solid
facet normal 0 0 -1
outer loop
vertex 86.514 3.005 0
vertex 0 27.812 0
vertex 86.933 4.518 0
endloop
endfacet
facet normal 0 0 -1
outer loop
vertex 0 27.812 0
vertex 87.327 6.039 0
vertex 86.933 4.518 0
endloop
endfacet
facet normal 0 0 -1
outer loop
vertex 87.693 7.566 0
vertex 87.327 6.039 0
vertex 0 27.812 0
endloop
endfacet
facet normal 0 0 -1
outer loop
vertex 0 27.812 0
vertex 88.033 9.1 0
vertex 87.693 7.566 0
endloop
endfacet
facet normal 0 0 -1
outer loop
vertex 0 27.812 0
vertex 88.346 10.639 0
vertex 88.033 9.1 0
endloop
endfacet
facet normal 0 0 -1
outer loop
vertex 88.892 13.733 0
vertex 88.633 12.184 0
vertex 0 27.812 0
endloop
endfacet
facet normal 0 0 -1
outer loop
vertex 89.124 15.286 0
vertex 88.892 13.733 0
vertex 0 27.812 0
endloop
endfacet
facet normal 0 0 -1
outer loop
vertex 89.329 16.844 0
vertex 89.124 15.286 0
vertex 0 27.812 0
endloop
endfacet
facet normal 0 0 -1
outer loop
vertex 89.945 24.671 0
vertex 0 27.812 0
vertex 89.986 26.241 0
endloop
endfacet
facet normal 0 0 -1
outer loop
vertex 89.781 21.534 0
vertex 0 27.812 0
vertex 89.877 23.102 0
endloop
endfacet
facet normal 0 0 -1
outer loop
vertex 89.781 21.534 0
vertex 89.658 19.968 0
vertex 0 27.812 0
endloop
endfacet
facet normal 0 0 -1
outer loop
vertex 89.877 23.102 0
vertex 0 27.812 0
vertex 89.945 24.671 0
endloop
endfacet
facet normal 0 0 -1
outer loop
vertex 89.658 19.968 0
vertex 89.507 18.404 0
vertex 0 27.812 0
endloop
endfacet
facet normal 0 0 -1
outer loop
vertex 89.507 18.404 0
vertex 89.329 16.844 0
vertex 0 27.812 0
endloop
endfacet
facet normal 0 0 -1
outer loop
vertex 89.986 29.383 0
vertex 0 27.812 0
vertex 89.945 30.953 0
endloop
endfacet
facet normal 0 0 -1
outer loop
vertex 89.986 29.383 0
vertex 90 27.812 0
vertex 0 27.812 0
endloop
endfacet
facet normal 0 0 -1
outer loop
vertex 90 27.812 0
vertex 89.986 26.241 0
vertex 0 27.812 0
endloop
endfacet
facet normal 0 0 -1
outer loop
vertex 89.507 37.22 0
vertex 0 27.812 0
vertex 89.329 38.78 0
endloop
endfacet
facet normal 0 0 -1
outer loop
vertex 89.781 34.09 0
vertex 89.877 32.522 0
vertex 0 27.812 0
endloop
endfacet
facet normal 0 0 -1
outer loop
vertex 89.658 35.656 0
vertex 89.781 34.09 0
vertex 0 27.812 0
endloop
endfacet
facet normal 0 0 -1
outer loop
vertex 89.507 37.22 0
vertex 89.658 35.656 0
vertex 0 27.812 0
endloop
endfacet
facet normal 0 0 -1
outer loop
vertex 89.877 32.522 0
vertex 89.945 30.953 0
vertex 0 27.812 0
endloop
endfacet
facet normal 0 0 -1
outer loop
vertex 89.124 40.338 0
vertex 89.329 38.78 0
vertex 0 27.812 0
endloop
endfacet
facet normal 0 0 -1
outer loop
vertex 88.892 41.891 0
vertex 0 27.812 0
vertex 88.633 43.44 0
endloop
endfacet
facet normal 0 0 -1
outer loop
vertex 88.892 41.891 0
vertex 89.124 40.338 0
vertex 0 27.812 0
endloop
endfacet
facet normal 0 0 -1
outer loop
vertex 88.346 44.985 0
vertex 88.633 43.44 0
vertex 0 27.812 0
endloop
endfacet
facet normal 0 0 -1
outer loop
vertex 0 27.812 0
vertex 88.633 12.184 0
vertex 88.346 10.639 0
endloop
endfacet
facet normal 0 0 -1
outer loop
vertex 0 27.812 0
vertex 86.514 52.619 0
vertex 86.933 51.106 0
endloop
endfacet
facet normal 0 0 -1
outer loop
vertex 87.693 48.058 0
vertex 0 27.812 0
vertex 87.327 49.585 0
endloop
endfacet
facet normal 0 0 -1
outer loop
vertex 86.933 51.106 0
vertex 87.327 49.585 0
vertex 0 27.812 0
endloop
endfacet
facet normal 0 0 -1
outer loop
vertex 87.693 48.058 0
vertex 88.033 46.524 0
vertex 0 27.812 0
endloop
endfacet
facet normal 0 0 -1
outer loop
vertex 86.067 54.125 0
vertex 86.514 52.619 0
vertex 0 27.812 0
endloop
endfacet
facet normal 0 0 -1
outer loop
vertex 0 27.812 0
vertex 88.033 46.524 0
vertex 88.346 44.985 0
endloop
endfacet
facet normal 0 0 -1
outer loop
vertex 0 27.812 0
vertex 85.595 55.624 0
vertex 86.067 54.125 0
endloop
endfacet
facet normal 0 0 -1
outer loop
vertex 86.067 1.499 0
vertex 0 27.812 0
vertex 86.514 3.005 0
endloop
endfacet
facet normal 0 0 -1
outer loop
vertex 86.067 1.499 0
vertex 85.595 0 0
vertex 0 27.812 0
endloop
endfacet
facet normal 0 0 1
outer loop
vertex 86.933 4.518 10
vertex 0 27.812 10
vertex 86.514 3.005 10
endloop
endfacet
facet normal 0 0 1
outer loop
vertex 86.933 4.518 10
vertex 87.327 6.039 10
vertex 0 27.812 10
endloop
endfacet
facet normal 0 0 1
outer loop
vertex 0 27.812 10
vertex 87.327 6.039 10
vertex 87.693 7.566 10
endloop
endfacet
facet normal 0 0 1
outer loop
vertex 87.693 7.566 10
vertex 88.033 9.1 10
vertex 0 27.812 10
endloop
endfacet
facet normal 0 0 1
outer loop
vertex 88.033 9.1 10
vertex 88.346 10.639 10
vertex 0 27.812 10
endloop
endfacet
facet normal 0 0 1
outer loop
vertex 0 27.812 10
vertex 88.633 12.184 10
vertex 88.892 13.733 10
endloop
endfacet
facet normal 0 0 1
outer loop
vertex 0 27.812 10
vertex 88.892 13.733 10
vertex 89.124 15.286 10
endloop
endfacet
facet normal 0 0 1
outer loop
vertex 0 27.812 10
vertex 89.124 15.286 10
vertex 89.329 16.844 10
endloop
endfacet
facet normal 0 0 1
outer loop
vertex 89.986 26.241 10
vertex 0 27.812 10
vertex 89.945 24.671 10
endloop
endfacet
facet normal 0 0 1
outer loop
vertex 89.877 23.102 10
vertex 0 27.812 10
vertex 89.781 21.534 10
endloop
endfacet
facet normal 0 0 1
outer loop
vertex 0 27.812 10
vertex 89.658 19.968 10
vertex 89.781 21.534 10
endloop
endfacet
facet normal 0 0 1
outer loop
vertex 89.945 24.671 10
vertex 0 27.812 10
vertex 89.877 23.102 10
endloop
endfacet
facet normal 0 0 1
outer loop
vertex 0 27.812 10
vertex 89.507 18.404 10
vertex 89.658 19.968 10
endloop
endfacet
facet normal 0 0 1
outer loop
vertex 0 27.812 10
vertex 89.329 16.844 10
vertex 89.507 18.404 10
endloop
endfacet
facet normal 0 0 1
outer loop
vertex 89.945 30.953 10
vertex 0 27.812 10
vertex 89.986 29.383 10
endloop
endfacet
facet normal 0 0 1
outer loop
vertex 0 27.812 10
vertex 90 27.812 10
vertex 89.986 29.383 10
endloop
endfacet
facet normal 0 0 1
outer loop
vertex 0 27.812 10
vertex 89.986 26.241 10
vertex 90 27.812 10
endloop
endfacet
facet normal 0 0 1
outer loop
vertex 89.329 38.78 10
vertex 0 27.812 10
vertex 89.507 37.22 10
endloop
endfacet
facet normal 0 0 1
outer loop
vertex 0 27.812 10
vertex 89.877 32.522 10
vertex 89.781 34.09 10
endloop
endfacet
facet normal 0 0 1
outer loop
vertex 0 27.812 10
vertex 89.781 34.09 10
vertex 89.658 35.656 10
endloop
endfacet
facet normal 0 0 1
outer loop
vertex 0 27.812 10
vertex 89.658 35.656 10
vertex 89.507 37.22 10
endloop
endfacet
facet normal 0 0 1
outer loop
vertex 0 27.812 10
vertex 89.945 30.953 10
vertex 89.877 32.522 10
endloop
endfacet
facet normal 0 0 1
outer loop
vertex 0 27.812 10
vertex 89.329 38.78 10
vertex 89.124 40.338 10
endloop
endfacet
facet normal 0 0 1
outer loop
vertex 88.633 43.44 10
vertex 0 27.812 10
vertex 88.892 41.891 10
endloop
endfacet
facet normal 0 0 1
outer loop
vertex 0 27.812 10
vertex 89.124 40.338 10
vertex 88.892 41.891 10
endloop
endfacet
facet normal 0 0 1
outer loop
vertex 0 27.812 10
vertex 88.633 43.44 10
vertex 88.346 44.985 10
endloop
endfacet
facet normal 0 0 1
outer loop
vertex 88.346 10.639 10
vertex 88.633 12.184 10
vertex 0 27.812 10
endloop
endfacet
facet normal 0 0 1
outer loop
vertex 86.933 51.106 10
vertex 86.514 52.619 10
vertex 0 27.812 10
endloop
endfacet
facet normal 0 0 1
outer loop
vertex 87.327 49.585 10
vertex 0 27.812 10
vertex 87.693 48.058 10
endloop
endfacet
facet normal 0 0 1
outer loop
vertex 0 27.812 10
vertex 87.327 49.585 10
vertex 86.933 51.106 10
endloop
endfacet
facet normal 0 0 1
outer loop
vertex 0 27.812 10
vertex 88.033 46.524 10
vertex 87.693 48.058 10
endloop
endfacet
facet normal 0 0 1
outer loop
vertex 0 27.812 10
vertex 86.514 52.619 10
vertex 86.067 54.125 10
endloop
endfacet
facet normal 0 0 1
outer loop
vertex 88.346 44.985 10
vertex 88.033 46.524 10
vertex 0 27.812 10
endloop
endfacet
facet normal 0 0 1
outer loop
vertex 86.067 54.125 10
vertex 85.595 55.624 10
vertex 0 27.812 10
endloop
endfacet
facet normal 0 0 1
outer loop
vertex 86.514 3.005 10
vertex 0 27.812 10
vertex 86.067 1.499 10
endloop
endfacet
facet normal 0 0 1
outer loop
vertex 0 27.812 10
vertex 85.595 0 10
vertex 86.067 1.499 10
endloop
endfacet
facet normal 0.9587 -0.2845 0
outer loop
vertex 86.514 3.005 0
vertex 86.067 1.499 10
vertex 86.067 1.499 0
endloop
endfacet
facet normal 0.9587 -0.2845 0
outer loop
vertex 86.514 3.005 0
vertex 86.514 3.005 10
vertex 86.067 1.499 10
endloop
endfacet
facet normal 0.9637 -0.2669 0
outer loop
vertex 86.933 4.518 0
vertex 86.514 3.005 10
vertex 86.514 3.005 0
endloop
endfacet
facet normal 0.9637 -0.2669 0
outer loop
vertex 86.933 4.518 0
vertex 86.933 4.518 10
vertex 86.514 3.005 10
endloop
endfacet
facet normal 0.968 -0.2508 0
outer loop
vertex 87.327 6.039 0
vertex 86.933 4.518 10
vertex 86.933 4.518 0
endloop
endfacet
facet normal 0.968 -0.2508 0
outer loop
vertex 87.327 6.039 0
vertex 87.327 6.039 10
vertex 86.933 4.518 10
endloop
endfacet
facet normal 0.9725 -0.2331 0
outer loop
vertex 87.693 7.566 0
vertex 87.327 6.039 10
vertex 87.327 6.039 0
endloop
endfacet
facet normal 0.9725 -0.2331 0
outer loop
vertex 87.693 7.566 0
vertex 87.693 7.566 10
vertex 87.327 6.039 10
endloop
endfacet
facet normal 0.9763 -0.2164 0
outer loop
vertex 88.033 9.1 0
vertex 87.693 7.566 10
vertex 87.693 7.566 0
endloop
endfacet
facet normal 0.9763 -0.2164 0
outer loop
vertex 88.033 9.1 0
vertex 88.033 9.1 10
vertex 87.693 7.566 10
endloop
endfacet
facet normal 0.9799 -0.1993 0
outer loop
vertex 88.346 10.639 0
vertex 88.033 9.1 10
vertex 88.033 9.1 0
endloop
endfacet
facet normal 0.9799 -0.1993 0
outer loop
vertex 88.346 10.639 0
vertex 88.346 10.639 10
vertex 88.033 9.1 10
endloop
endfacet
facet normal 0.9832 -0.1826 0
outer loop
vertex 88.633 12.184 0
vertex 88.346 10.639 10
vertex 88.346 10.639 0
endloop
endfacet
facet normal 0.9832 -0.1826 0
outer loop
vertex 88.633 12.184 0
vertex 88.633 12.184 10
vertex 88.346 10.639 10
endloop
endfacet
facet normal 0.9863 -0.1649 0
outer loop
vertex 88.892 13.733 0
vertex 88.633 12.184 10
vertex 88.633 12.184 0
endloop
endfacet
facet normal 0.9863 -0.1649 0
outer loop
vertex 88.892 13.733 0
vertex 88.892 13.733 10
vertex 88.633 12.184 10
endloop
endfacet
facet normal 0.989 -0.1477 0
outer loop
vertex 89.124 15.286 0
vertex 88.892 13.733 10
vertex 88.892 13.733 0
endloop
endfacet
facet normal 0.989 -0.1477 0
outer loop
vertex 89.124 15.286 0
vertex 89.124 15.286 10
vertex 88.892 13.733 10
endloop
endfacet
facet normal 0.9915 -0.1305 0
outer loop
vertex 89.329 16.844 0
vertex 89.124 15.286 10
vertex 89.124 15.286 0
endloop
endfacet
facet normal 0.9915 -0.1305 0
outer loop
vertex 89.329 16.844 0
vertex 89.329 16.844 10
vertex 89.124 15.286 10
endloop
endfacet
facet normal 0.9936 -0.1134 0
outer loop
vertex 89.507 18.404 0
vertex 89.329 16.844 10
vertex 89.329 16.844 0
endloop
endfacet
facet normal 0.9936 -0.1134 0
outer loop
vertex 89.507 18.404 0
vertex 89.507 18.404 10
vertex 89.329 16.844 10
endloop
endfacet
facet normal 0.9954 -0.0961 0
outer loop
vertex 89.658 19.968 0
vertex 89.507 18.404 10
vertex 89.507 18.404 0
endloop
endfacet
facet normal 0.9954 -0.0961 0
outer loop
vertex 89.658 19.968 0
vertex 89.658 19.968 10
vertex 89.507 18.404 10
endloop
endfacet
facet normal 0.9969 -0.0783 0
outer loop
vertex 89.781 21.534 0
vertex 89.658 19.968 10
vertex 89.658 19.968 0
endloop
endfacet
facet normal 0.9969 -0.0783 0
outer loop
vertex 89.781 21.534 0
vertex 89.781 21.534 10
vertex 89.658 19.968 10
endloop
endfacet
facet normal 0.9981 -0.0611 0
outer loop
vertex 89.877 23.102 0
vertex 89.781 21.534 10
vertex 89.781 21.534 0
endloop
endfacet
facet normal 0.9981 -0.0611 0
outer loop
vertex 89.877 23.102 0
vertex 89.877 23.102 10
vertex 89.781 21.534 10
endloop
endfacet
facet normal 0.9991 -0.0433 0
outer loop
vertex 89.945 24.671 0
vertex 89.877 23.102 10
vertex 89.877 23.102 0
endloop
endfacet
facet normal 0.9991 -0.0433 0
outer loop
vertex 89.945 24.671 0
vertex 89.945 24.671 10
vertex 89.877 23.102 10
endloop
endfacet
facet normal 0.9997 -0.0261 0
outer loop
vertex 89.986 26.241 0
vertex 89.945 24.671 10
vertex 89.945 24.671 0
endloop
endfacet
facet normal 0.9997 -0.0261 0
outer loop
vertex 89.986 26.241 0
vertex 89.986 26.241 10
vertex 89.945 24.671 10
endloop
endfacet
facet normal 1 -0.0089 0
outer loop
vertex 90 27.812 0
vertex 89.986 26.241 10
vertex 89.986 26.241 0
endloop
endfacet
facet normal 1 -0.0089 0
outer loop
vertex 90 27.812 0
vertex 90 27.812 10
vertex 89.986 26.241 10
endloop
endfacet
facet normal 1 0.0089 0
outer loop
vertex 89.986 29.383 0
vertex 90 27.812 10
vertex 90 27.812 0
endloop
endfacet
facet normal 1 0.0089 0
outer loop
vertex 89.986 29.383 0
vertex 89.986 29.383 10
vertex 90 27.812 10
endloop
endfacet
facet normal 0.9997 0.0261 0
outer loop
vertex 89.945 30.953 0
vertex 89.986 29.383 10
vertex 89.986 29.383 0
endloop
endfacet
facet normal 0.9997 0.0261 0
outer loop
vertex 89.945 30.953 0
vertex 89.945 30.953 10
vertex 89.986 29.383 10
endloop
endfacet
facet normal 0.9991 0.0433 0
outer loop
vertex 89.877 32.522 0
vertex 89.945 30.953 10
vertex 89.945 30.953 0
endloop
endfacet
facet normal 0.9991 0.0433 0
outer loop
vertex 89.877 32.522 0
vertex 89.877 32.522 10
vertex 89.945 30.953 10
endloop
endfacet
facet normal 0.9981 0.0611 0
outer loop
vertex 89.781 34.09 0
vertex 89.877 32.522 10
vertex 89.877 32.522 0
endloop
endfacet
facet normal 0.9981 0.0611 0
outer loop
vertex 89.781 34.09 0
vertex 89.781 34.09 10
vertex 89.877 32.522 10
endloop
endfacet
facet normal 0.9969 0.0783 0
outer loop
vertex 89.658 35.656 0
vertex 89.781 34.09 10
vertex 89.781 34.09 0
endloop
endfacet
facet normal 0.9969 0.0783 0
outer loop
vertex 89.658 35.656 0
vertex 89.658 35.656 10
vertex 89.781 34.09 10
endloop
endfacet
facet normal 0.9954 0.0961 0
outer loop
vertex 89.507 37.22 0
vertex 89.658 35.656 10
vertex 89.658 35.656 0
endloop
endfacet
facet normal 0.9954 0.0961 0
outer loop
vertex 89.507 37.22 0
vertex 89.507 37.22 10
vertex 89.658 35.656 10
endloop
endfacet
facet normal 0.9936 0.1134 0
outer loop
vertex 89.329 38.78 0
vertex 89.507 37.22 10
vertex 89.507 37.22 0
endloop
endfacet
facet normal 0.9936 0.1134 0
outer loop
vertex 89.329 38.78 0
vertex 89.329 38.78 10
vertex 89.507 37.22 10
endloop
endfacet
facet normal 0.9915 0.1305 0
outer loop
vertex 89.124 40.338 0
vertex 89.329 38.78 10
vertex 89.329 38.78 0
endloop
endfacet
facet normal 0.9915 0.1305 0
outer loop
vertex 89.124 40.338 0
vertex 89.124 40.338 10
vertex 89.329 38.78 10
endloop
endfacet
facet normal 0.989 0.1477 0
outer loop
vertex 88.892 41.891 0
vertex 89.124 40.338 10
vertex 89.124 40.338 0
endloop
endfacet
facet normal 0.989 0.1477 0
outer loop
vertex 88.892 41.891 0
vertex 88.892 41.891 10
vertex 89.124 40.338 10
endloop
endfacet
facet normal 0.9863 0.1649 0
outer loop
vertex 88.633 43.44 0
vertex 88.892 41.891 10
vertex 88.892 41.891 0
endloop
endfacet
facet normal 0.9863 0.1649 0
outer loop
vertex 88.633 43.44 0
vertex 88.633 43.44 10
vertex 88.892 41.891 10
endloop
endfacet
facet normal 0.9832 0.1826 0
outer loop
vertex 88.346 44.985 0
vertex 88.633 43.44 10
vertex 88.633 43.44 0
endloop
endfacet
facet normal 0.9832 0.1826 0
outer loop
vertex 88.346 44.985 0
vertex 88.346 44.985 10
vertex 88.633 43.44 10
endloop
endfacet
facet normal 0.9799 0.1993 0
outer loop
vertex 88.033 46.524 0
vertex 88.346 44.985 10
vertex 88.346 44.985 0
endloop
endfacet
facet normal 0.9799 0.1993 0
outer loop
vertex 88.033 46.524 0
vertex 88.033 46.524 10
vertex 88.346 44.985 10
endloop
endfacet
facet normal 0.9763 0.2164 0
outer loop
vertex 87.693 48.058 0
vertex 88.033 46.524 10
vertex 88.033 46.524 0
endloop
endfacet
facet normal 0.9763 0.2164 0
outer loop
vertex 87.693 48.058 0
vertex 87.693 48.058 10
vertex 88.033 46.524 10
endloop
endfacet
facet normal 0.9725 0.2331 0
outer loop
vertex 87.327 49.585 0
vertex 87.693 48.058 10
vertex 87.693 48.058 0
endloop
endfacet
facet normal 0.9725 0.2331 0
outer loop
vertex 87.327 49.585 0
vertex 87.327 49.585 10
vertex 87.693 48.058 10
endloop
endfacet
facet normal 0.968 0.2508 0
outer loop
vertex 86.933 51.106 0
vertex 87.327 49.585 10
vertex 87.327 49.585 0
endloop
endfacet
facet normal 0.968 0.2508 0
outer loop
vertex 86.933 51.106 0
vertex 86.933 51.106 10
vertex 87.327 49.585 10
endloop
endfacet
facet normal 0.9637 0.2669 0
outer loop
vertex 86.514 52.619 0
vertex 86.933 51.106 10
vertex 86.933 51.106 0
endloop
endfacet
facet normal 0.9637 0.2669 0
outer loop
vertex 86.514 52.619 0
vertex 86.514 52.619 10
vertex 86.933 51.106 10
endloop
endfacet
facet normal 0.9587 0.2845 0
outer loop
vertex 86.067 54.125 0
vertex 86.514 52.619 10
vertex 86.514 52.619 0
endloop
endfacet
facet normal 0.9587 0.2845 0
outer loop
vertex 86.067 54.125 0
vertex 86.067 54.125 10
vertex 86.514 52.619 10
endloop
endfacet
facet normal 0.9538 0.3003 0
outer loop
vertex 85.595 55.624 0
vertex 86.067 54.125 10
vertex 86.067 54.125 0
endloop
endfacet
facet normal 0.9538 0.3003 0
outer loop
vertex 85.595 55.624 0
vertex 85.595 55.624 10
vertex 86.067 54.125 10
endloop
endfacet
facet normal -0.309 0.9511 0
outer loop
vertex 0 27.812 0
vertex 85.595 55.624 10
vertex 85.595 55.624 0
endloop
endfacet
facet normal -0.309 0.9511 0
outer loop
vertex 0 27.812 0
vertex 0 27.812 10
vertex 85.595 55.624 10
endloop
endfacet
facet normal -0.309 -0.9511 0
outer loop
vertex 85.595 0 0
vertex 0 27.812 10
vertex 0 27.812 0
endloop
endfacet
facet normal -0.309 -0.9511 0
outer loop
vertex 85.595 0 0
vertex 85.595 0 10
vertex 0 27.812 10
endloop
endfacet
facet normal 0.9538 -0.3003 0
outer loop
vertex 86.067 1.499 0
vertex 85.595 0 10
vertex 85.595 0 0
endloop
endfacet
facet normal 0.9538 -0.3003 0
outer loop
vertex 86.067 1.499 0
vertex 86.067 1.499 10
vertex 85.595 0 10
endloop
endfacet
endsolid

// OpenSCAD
$fn = 32;

// ----------------------------------------------------------------------
// Arc profile plate: sector, 38 points
// ----------------------------------------------------------------------

// --- parameters (mm) ---
sector_angle = 36;        // sector angle, degrees
sector_r = 90;            // outer radius
arc_step = 1;             // sampling step of the arc, degrees
plate_t = 10;             // plate thickness, Z
fit_tol = 0.05;           // declared fit tolerance (prompt contract)
free_tol = 0.3;           // declared free tolerance (prompt contract)

bbox_x = 2 * sector_r * sin(sector_angle / 2);  // chord of the sector
bbox_y = sector_r;  // depth of the sector (apex to arc)

profile = [[85.595, 0], [86.067, 1.499], [86.514, 3.005], [86.933, 4.518], [87.327, 6.039], [87.693, 7.566], [88.033, 9.1], [88.346, 10.639], [88.633, 12.184], [88.892, 13.733], [89.124, 15.286], [89.329, 16.844], [89.507, 18.404], [89.658, 19.968], [89.781, 21.534], [89.877, 23.102], [89.945, 24.671], [89.986, 26.241], [90, 27.812], [89.986, 29.383], [89.945, 30.953], [89.877, 32.522], [89.781, 34.09], [89.658, 35.656], [89.507, 37.22], [89.329, 38.78], [89.124, 40.338], [88.892, 41.891], [88.633, 43.44], [88.346, 44.985], [88.033, 46.524], [87.693, 48.058], [87.327, 49.585], [86.933, 51.106], [86.514, 52.619], [86.067, 54.125], [85.595, 55.624], [0, 27.812]];  // primary outline, 38 points, counter clockwise

// --- the one profile operation ---
linear_extrude(height = plate_t) polygon(points = profile);
